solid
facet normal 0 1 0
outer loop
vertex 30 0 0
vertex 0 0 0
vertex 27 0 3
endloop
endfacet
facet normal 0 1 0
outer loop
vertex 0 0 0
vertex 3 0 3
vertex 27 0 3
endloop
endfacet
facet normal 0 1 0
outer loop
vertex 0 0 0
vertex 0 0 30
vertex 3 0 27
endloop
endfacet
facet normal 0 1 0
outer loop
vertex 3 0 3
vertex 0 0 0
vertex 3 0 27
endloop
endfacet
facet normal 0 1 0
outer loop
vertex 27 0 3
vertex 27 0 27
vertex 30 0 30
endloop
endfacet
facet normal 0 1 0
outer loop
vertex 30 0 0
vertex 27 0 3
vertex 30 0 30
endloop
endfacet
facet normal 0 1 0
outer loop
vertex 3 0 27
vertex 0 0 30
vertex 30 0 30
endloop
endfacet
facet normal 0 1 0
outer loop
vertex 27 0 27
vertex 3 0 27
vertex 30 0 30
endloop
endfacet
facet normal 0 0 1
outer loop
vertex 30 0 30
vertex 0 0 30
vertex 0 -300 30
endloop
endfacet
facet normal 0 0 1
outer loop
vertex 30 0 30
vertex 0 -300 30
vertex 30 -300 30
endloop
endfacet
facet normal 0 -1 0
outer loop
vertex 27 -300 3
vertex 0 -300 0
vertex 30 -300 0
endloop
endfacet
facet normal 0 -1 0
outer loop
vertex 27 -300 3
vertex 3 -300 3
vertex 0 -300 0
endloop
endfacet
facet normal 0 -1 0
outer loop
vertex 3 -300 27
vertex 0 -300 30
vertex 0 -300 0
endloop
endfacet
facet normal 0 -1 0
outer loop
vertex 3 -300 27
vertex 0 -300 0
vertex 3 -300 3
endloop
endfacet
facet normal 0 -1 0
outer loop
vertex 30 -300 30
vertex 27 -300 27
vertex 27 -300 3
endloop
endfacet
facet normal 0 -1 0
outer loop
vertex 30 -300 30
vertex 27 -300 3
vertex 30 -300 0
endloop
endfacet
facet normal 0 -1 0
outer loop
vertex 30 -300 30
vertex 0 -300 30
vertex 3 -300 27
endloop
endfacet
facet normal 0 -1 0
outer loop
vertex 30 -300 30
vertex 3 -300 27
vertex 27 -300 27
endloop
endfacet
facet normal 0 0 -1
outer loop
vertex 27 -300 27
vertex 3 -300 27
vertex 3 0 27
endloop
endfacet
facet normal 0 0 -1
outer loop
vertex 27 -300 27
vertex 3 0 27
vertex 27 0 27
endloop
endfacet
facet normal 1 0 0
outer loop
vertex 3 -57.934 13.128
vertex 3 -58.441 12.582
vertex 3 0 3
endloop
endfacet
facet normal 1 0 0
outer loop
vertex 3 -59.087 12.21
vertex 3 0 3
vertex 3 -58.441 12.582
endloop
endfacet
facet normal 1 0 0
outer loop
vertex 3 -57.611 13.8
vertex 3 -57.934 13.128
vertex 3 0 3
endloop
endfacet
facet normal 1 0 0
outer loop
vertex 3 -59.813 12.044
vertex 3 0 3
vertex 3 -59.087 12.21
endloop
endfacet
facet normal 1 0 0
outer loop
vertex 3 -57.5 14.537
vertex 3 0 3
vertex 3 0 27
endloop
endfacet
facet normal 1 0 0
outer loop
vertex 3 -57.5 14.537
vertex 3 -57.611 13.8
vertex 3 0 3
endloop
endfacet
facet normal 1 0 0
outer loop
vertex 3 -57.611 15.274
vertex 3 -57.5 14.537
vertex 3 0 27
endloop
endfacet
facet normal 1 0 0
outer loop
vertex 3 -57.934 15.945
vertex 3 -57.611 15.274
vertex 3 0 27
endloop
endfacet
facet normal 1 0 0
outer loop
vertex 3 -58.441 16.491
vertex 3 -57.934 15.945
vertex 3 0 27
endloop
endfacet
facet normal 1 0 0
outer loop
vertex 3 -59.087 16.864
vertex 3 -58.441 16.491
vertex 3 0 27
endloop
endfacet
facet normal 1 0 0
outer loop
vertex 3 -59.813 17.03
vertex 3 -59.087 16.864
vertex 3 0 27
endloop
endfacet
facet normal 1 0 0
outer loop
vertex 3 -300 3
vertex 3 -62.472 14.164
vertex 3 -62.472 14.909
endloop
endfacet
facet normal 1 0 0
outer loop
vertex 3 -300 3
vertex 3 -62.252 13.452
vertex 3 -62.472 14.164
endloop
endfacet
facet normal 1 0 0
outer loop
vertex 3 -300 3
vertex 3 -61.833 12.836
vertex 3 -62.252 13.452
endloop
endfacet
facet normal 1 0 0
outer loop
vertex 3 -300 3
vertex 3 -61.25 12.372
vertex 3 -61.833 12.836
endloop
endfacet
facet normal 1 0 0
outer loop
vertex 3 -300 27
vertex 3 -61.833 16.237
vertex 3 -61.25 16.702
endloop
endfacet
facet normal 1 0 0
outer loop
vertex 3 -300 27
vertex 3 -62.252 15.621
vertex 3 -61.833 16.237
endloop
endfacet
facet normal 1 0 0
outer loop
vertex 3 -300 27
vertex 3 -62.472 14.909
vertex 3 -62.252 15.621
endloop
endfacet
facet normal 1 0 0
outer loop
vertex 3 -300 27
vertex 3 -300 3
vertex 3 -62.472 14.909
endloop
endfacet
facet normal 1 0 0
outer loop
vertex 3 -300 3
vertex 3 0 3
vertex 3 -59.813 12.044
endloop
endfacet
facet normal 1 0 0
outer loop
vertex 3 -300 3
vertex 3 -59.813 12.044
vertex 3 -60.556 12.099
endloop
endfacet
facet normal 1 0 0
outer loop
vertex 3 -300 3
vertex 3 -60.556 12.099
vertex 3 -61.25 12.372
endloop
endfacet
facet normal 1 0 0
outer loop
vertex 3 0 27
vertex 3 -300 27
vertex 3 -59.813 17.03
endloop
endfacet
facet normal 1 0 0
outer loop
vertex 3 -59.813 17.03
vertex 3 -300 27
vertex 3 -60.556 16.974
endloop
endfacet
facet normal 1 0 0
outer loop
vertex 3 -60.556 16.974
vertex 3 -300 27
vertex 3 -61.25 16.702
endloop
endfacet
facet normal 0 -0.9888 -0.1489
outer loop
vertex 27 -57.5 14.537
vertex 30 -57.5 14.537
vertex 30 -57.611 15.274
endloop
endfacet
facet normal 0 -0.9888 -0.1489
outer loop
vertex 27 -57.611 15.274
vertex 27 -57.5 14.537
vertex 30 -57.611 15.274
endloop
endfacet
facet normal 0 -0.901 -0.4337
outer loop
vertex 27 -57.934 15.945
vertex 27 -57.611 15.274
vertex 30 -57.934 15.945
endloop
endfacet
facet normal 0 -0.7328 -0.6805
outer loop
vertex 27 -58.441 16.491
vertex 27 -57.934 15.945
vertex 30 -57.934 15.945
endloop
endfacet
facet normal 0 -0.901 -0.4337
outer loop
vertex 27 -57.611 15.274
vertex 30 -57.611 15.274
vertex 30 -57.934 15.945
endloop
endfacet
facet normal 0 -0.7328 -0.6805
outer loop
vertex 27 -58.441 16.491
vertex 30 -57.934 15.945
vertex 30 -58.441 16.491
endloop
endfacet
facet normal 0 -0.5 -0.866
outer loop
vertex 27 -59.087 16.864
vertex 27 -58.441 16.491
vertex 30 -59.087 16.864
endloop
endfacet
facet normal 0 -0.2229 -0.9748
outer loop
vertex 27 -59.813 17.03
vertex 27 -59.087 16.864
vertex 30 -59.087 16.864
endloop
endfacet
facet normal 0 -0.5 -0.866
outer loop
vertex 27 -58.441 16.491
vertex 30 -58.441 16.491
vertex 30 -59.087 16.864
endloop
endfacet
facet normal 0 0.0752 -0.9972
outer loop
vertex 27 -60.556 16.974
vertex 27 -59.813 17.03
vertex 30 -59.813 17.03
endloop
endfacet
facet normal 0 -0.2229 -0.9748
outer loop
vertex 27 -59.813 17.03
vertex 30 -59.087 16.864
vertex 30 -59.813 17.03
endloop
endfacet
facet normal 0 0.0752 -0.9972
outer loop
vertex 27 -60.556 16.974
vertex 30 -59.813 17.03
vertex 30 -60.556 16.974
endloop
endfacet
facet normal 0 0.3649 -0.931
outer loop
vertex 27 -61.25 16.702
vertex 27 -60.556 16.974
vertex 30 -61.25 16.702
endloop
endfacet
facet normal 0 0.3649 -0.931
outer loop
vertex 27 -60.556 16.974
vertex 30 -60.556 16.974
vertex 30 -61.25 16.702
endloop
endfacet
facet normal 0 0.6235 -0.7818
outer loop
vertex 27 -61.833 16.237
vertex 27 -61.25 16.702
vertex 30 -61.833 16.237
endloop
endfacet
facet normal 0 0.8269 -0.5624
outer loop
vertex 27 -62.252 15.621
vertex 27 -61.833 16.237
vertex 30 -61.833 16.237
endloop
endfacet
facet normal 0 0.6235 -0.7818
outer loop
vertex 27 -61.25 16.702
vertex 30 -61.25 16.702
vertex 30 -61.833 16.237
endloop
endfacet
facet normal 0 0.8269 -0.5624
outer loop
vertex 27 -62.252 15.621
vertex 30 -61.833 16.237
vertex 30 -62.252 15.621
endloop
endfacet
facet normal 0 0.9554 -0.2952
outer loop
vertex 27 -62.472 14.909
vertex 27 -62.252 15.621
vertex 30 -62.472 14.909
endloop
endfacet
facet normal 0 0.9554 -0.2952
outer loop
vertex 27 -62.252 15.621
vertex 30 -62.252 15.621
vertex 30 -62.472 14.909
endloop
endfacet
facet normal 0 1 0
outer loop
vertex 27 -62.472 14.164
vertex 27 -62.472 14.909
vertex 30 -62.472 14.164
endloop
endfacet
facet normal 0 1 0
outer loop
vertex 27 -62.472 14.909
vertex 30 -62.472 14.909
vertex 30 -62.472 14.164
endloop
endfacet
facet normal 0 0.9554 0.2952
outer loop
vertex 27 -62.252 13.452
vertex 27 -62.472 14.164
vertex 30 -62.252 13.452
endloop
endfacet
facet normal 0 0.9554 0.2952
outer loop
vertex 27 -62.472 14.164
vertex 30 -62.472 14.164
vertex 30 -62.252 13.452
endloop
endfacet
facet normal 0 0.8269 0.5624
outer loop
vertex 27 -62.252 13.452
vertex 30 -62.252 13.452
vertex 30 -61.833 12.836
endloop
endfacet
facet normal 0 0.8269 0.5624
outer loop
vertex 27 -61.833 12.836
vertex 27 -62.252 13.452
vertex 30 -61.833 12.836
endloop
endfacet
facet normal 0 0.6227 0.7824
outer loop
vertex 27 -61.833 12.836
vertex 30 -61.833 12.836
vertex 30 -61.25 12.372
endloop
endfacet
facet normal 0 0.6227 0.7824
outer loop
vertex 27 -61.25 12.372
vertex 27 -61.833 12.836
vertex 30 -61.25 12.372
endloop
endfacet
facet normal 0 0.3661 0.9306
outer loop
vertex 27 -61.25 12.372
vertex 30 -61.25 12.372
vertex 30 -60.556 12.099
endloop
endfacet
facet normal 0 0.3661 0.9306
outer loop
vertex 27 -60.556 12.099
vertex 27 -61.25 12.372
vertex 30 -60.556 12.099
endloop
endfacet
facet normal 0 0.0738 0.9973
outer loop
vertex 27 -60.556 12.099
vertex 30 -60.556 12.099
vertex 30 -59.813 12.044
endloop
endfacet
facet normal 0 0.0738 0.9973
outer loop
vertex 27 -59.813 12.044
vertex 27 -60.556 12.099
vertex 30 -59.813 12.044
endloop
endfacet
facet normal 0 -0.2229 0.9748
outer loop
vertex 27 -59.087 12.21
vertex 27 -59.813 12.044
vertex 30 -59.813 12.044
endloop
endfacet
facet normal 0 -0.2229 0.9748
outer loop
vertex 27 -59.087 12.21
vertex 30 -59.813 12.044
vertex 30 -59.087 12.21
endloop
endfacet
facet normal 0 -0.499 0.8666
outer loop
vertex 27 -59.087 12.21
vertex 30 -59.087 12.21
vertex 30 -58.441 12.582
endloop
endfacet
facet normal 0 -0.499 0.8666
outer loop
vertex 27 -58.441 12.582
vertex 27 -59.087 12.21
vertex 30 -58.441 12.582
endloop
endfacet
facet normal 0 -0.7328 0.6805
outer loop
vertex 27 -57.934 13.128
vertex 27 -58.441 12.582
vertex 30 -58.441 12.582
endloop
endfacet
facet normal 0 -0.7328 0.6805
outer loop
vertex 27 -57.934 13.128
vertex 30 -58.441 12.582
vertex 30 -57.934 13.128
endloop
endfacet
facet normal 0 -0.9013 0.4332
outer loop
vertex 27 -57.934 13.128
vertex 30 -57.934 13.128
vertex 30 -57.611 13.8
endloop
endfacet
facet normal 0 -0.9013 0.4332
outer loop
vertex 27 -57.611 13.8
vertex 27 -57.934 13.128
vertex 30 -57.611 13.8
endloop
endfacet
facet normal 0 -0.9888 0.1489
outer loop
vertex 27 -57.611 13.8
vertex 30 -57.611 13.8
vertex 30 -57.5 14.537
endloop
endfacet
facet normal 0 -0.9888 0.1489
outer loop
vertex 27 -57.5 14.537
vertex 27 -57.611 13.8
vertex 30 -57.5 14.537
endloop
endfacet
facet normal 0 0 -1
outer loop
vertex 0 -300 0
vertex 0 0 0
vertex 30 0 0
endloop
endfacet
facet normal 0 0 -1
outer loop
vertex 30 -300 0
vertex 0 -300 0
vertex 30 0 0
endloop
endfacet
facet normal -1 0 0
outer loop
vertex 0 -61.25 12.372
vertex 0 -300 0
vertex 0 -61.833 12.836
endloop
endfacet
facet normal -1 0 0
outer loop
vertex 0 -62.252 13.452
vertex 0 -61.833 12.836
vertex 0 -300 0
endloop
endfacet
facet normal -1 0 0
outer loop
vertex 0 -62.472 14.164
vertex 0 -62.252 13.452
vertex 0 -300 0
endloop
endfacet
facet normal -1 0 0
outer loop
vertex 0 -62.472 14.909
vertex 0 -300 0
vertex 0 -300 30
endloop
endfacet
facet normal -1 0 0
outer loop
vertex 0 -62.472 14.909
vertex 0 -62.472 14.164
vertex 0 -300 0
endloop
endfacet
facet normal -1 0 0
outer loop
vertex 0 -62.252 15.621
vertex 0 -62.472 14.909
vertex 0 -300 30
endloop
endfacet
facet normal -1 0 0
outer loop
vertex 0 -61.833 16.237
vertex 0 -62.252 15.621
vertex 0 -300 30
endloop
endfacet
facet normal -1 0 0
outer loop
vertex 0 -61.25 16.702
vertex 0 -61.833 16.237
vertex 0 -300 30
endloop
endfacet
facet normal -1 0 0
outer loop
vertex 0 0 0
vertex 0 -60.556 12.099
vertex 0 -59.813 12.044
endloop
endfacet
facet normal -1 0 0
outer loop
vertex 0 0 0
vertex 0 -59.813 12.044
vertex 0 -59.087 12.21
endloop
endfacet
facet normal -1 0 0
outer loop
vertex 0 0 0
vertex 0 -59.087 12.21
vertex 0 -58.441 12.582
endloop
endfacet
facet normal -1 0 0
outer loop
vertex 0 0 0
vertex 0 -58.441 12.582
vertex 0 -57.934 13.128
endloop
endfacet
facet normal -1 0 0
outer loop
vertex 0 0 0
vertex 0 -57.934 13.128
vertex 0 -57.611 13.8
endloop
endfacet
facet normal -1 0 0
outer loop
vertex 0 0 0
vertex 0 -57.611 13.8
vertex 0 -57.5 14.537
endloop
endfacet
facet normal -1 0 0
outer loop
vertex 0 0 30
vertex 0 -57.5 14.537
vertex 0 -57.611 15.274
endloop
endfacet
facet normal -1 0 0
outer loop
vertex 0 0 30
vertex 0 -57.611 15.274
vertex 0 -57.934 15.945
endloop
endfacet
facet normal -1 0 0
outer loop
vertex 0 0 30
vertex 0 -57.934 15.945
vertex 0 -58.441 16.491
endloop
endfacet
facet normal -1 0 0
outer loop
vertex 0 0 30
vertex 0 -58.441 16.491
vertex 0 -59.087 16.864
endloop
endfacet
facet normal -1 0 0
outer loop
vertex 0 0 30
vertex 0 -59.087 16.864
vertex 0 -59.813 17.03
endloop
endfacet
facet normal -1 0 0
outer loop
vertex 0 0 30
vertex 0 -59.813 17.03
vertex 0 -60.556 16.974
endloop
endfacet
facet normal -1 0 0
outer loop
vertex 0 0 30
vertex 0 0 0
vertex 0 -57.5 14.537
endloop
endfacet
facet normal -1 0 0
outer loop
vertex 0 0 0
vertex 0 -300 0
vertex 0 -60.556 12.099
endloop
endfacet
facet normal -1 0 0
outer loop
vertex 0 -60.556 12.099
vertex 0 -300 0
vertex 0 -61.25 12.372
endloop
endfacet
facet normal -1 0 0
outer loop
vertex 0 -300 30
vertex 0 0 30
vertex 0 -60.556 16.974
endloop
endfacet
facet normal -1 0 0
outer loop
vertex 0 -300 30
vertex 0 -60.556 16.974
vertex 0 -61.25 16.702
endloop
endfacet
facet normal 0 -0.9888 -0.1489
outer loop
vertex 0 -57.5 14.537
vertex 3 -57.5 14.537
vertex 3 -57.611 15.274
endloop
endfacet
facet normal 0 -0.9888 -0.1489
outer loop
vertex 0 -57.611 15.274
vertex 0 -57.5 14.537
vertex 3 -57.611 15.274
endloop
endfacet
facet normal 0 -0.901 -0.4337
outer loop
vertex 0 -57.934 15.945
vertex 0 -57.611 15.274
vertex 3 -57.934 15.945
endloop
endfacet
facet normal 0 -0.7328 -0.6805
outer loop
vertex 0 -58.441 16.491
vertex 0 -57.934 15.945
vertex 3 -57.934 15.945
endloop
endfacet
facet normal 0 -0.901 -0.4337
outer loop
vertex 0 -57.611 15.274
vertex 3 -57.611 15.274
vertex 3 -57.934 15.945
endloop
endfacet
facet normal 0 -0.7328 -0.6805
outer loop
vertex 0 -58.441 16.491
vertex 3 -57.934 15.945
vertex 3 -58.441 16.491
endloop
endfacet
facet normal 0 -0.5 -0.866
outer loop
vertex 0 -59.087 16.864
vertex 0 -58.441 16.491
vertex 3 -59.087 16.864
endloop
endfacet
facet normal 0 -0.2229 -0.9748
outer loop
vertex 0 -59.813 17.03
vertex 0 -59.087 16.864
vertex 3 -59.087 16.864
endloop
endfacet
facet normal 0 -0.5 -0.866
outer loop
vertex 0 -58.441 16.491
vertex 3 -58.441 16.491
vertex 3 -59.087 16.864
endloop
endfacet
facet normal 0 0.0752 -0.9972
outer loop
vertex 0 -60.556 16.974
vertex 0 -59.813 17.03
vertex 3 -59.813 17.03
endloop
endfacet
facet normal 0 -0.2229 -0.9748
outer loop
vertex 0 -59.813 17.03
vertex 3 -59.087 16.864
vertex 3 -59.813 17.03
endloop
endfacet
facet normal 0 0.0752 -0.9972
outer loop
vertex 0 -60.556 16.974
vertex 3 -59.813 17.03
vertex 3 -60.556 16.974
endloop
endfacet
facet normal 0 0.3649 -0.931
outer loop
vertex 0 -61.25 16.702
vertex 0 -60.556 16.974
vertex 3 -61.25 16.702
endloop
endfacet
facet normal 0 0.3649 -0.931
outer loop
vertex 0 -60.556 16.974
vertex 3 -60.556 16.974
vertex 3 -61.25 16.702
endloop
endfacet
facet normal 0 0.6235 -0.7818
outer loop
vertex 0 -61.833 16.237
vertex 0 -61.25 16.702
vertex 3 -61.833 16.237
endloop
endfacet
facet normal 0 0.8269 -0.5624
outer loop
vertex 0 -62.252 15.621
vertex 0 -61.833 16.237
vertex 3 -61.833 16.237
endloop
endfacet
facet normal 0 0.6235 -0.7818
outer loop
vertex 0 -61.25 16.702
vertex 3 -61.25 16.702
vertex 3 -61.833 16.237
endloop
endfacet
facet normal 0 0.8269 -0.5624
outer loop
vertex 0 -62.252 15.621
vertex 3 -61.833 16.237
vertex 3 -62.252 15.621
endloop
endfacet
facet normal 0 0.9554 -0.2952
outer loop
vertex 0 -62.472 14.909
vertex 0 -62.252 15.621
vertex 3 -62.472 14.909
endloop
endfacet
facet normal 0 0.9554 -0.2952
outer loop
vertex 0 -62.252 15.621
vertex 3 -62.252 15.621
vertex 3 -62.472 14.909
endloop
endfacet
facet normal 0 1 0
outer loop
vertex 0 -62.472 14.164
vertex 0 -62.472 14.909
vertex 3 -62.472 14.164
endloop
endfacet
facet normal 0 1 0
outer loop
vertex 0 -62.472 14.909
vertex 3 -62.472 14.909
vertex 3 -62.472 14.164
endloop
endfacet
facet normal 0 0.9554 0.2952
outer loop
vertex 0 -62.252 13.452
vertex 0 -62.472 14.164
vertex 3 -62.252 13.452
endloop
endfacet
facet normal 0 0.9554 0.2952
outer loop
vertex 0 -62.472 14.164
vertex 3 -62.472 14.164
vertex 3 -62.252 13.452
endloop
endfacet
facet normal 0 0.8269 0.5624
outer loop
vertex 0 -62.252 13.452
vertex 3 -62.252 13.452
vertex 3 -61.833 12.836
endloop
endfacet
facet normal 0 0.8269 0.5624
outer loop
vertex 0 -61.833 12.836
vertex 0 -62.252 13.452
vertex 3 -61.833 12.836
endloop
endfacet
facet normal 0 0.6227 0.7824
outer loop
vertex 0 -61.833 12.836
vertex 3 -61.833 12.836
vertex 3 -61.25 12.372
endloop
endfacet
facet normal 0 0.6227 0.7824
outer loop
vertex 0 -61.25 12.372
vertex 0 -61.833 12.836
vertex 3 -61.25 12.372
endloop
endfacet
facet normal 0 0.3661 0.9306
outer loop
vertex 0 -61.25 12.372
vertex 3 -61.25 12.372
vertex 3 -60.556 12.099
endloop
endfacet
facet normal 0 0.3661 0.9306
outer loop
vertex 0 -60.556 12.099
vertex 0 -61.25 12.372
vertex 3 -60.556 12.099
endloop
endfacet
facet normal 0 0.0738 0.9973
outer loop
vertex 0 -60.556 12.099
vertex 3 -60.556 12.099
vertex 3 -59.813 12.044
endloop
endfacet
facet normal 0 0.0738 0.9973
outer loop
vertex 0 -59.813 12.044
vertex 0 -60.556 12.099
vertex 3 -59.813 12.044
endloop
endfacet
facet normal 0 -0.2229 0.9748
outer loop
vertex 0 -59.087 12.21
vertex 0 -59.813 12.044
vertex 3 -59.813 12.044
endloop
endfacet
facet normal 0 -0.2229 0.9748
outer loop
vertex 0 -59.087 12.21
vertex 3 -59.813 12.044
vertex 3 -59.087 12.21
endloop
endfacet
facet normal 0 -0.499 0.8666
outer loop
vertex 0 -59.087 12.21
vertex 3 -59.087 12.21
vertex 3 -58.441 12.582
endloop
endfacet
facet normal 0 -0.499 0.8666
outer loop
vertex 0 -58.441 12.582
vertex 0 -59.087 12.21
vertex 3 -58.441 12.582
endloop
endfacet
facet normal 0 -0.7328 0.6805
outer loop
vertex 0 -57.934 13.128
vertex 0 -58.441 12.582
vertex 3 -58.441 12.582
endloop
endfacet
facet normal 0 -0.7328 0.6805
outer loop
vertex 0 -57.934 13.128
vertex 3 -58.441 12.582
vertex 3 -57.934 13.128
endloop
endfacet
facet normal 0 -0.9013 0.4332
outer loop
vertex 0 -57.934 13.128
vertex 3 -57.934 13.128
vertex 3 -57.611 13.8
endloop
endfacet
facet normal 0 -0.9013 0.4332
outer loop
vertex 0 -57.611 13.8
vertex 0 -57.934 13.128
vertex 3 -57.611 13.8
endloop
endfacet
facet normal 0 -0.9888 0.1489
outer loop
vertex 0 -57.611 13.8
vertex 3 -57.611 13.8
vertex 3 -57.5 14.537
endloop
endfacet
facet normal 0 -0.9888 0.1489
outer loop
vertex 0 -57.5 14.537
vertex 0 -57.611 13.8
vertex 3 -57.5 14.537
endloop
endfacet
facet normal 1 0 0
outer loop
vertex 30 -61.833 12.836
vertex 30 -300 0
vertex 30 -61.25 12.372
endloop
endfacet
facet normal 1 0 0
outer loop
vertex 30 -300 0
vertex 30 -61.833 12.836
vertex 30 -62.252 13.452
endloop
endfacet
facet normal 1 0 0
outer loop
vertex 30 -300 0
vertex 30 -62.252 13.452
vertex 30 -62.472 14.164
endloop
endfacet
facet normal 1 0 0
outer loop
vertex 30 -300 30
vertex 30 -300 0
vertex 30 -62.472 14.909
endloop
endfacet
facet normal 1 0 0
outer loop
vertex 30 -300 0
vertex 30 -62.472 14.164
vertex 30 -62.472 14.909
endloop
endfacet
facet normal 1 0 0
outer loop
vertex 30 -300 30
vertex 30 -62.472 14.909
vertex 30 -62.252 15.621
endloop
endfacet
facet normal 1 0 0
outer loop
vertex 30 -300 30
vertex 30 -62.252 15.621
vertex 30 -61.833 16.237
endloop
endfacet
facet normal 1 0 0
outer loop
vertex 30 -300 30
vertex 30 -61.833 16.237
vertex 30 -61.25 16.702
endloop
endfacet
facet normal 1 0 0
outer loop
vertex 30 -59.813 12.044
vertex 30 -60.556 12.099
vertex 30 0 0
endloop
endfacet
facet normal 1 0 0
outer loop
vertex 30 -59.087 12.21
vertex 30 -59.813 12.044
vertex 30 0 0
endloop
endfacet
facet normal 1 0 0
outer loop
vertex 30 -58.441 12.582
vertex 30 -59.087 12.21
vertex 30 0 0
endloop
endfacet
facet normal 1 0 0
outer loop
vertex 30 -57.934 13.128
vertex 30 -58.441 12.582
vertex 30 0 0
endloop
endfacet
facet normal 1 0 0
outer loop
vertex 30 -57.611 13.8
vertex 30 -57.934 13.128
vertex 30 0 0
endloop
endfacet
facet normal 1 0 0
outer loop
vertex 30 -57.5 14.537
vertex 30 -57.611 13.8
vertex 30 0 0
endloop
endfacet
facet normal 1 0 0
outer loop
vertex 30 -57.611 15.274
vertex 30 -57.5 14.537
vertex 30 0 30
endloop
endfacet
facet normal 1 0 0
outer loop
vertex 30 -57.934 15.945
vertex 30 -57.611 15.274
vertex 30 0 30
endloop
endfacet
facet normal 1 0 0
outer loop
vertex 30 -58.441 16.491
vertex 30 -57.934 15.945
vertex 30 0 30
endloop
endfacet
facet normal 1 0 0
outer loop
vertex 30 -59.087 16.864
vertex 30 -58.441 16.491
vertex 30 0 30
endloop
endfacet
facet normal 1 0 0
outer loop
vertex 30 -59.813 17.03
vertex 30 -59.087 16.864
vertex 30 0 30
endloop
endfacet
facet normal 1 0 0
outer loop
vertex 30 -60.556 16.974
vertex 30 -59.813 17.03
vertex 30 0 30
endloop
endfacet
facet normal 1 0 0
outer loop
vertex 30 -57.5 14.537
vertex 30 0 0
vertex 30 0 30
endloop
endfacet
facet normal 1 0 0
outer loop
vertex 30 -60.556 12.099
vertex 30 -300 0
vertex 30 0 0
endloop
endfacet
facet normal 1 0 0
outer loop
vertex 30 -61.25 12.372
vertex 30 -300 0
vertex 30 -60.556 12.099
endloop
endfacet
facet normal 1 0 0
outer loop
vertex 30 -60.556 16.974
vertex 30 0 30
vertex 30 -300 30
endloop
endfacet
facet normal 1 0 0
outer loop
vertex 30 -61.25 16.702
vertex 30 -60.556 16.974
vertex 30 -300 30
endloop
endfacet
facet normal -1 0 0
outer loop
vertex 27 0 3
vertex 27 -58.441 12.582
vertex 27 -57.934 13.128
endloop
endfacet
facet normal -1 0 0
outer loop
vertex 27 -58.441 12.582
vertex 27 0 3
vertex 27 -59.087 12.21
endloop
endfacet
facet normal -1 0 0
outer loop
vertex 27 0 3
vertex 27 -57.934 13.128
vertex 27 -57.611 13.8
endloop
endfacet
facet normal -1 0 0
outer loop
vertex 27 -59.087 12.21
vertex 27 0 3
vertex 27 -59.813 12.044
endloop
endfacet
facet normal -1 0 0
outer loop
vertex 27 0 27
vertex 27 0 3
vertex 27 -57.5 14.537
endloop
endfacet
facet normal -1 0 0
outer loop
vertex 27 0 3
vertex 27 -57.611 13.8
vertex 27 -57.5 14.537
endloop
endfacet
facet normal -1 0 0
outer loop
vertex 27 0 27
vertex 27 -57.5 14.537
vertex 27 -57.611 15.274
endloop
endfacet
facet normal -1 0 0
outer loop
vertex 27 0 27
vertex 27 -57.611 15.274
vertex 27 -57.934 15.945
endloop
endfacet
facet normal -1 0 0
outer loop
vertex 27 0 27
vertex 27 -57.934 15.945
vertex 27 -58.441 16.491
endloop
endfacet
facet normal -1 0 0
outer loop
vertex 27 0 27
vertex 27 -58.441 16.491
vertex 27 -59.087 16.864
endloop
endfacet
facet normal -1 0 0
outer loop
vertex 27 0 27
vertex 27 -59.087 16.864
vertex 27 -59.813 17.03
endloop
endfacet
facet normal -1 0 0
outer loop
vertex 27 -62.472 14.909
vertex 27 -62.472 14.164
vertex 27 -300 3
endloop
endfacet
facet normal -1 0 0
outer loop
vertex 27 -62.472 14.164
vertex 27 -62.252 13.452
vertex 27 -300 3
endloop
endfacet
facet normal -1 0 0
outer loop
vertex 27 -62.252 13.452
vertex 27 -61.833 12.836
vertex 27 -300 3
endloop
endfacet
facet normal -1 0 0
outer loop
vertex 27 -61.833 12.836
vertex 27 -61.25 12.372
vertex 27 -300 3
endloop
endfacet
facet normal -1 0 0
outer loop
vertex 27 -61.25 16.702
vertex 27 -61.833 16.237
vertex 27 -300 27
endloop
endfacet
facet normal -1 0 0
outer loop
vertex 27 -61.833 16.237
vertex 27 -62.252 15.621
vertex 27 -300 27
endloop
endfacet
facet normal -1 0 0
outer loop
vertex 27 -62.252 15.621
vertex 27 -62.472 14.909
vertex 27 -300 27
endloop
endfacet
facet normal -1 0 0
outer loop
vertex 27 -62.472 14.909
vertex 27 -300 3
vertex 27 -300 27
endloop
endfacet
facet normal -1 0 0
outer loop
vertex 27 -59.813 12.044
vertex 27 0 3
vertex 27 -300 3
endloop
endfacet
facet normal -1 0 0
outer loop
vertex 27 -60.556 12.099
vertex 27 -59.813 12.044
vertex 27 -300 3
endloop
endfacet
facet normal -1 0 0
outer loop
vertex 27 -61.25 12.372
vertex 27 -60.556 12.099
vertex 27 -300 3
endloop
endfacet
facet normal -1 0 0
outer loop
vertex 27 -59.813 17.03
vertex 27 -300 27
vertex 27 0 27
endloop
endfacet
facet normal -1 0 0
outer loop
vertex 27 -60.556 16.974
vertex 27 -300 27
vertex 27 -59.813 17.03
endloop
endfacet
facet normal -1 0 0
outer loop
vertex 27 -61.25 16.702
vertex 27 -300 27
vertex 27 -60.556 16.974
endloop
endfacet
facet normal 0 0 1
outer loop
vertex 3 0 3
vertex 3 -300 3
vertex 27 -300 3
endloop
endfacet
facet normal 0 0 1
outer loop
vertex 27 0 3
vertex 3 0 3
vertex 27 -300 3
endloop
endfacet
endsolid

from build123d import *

# Parameters (mm, degrees)
F0_W     = 30
F0_H     = 30
F1_DEPTH = 300
F2_W     = 24
F2_H     = 24
F3_DEPTH = 300.001
F4_R     = 2.5
F5_DEPTH = 30.001


with BuildPart() as f1:
    # F0 (on Front) → F1 (new body)
    with BuildSketch(Plane.XZ):
        with Locations((15, 15)):
            Rectangle(F0_W, F0_H)
    extrude(amount=F1_DEPTH)

    # F2 (on face) → F3 (cut, through all)
    with BuildSketch(Plane.XZ.offset(300)):
        with Locations((15, 15)):
            Rectangle(F2_W, F2_H)
    extrude(amount=-F3_DEPTH, mode=Mode.SUBTRACT)

    # F4 (on face) → F5 (cut, through all)
    with BuildSketch(Plane.YZ.offset(30)):
        with Locations((-60, 14.536702)):
            Circle(F4_R)
    extrude(amount=-F5_DEPTH, mode=Mode.SUBTRACT)


solid = f1.part
